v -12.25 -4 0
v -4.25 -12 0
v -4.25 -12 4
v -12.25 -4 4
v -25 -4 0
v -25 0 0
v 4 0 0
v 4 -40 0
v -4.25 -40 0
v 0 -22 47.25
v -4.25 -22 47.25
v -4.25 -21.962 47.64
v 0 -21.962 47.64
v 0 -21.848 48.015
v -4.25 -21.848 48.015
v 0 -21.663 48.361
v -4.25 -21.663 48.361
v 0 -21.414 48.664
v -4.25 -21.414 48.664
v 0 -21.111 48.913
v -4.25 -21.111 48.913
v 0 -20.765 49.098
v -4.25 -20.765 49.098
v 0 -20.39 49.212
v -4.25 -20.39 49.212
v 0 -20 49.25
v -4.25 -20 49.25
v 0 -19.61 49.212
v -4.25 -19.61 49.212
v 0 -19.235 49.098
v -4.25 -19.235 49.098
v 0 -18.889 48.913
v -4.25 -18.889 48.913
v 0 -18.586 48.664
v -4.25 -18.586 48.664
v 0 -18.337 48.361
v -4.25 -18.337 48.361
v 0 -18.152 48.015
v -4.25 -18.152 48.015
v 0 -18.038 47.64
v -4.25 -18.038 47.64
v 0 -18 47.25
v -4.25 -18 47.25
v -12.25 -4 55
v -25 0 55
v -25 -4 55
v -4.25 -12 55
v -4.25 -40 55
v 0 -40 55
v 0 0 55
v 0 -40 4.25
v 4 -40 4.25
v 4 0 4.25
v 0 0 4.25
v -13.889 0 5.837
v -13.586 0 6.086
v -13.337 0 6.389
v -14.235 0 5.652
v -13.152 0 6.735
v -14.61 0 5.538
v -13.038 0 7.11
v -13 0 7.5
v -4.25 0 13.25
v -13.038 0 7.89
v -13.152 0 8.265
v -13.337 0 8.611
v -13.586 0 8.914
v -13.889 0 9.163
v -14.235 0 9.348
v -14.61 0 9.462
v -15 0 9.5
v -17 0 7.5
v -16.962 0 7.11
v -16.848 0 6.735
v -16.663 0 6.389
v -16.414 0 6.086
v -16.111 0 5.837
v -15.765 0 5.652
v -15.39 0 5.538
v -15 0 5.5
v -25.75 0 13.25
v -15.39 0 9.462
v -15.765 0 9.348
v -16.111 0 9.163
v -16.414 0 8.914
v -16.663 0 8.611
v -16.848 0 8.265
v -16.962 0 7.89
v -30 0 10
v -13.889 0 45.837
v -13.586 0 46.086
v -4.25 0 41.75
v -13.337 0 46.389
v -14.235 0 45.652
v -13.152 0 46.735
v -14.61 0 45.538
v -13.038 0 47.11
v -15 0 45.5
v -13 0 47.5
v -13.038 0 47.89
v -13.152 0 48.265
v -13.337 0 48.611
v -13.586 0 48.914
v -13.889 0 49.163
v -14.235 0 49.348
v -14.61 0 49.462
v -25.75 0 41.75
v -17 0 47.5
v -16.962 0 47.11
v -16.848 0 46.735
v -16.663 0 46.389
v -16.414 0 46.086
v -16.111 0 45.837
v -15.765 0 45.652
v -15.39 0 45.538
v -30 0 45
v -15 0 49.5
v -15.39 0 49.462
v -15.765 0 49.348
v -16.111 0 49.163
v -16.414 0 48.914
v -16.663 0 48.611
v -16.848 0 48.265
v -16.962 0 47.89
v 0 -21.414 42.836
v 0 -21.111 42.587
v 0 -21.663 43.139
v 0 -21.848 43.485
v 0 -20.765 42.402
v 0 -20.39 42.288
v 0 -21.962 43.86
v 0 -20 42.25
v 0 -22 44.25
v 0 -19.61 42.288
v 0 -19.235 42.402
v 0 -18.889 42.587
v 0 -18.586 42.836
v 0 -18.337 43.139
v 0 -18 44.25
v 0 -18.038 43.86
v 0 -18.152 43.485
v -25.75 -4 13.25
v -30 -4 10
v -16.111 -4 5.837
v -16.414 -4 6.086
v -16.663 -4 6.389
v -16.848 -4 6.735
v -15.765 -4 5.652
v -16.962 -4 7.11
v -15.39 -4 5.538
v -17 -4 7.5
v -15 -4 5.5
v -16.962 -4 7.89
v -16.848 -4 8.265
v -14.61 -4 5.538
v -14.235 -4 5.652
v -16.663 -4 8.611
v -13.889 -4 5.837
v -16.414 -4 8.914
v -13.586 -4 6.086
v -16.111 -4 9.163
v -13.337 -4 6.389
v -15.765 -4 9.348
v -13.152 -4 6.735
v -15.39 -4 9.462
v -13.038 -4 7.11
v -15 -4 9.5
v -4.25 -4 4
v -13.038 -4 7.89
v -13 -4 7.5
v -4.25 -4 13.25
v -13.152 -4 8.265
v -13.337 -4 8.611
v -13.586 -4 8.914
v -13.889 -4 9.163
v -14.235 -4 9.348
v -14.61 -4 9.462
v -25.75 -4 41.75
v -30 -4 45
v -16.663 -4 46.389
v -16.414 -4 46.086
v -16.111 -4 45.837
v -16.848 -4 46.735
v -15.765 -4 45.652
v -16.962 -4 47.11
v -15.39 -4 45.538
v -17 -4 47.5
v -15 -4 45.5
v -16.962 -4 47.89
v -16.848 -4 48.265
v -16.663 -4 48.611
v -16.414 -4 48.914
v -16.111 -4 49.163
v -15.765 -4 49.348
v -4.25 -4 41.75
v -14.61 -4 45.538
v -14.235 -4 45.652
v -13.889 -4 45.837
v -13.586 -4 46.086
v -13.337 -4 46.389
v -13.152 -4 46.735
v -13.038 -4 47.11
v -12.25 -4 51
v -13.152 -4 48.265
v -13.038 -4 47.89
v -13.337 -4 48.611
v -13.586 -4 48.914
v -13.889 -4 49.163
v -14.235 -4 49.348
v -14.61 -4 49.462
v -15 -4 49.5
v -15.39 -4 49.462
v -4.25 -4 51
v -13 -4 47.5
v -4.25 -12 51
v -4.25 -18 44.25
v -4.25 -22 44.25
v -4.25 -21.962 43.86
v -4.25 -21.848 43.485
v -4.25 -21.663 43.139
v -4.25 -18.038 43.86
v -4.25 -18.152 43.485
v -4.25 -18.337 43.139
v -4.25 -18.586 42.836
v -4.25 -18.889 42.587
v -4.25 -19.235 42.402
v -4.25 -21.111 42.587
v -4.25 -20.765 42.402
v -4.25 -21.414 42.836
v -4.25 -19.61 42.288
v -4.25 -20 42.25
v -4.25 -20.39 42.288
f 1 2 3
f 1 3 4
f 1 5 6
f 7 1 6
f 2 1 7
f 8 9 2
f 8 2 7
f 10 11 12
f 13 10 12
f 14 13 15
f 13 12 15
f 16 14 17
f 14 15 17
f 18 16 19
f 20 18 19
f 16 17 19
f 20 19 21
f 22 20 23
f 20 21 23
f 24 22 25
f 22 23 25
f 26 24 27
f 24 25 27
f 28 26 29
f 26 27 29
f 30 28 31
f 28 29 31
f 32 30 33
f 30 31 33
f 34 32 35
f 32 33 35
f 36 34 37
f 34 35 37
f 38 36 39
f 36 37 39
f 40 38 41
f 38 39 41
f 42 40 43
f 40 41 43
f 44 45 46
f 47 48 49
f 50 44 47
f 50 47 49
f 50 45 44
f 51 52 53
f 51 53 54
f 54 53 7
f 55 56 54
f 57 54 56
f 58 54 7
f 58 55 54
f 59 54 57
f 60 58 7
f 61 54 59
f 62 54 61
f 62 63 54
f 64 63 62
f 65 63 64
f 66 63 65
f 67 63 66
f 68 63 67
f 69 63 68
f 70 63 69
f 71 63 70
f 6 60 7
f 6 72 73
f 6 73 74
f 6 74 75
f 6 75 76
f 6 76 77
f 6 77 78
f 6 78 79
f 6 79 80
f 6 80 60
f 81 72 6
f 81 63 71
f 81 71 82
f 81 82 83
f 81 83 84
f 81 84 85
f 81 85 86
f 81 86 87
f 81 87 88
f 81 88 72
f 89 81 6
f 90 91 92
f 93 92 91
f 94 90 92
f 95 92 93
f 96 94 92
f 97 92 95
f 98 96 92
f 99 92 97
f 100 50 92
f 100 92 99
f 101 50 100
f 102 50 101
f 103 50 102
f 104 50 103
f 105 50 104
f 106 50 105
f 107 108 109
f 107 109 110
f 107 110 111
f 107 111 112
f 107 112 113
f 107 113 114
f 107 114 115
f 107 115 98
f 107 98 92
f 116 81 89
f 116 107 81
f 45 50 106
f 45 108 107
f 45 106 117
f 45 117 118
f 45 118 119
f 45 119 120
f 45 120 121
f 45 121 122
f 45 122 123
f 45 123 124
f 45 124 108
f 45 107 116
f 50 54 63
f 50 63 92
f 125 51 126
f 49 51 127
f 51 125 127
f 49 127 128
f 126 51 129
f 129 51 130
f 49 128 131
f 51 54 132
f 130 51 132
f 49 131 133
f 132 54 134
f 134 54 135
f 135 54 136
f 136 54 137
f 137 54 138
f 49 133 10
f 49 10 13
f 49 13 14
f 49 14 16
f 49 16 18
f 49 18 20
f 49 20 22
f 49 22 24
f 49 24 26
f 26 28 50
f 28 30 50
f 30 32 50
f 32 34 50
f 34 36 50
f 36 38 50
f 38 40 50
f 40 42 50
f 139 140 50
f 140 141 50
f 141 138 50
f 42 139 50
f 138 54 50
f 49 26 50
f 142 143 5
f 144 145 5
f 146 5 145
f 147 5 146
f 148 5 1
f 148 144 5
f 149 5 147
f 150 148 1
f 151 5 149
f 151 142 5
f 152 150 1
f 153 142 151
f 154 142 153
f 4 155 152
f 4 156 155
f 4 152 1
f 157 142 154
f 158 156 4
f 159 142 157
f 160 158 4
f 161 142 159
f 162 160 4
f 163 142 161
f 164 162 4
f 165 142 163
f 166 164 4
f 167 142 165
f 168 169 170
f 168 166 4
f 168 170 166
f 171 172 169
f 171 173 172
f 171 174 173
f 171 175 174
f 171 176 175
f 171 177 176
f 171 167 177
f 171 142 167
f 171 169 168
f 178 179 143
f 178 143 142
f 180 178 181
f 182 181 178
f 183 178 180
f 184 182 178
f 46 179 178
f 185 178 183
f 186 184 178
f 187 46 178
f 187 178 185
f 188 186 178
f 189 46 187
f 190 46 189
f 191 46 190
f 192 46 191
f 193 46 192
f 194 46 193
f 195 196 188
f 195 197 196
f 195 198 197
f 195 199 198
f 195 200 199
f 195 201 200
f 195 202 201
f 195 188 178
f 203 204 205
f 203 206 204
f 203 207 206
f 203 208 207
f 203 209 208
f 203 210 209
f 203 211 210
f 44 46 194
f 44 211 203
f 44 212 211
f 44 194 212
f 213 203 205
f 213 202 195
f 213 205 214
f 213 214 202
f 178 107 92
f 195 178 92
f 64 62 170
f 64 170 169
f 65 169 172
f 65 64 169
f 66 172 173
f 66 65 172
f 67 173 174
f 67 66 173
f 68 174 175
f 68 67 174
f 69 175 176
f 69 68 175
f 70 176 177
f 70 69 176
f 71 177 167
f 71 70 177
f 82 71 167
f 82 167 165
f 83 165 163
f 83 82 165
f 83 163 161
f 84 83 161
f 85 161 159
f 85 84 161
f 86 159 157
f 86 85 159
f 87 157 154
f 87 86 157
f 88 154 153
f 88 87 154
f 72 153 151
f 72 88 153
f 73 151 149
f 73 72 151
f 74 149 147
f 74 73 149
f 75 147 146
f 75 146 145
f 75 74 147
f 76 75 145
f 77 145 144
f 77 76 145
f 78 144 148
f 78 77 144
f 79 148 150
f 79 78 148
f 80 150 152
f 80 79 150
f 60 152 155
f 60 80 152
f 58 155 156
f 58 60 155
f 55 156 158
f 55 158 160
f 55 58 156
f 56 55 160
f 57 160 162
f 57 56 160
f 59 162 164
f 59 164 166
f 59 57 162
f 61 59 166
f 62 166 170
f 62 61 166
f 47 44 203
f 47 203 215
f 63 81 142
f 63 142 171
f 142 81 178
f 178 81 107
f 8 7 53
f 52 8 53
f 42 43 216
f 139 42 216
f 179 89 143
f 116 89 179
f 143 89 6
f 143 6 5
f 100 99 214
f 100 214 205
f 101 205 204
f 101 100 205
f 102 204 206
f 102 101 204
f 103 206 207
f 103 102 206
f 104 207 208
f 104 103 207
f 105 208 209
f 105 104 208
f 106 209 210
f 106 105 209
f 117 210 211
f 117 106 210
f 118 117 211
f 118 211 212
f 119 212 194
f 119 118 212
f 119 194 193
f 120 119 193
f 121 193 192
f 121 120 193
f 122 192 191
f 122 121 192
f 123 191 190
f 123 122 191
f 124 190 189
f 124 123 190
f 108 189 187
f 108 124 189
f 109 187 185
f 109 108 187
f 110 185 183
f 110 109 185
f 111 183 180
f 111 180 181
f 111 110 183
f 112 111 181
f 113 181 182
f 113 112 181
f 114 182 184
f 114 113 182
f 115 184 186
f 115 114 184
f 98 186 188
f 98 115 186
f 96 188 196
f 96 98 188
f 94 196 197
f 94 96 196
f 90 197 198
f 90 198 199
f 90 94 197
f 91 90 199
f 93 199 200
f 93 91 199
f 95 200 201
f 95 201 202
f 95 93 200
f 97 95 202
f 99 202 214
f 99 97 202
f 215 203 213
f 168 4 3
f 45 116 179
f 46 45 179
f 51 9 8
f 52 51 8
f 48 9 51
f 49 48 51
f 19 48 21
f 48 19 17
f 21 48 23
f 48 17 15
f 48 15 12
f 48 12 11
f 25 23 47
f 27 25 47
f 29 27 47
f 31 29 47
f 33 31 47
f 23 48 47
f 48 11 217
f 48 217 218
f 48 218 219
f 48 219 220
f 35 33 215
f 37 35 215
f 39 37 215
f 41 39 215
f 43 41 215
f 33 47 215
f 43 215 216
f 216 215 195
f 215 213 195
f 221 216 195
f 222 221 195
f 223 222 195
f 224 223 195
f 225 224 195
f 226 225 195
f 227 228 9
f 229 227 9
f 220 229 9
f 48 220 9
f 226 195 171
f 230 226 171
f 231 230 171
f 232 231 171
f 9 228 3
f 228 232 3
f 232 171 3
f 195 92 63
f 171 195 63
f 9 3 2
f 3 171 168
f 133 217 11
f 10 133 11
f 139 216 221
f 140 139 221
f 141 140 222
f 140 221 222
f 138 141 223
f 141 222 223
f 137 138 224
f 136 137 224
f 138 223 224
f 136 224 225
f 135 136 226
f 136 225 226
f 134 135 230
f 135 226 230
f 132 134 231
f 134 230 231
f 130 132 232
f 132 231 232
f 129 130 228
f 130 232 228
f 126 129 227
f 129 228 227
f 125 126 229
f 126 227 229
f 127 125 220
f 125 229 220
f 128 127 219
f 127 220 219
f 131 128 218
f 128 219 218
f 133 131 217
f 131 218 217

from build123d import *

# Parameters (mm, degrees)
F0_W      = 30
F0_H      = 55
F0_R      = 2
F0_W_2    = 21.5
F0_H_2    = 28.5
F1_DEPTH  = 4
F3_DEPTH  = 36
F5_DEPTH  = 4
F7_W      = 4
F7_H      = 4.25
F8_DEPTH  = 4
F10_DEPTH = 4
F11_DEPTH = 8.251
F12_SIZE2 = 10
F12_SIZE  = 5


with BuildPart() as f1:
    # F0 (on Front) → F1 (new body)
    with BuildSketch(Plane.XZ):
        with Locations((-15, 27.5)):
            Rectangle(F0_W, F0_H)
        with Locations((-15, 7.5)):
            Circle(F0_R, mode=Mode.SUBTRACT)
        with Locations((-15, 27.5)):
            Rectangle(F0_W_2, F0_H_2, mode=Mode.SUBTRACT)
        with Locations((-15, 47.5)):
            Circle(F0_R, mode=Mode.SUBTRACT)
    extrude(amount=F1_DEPTH)

    # F2 (on face) → F3 (join)
    with BuildSketch(Plane.XZ.offset(4)):
        Polygon((0, 4.25), (0, 55), (-4.25, 55), (-4.25, 0), (4, 0), (4, 4.25), align=None)
    extrude(amount=F3_DEPTH)

    # F4 (on face) → F5 (join)
    with BuildSketch(Plane.XY.offset(55)):
        Polygon((-4.25, -12), (-4.25, -4), (-12.25, -4), align=None)
    extrude(amount=-F5_DEPTH)

    # F7 (on face) → F8 (join)
    with BuildSketch(Plane(origin=(0, -4, 0), x_dir=(-1, 0, 0), z_dir=(0, 1, 0))):
        with Locations((-2, 2.125)):
            Rectangle(F7_W, F7_H)
    extrude(amount=F8_DEPTH)

    # F9 (on face) → F10 (join)
    with BuildSketch(Plane(origin=(0, 0, 0), x_dir=(1, 0, 0), z_dir=(0, 0, -1))):
        Polygon((-4.25, 12), (-12.25, 4), (-4.25, 4), align=None)
    extrude(amount=-F10_DEPTH)

    # F6 (on face) → F11 (cut, through all)
    with BuildSketch(Plane(origin=(-4.25, 0, 0), x_dir=(0, -1, 0), z_dir=(-1, 0, 0))):
        with BuildLine():
            ThreePointArc((22, 47.25), (20, 49.25), (18, 47.25))
            Line((18, 47.25), (18, 44.25))
            ThreePointArc((18, 44.25), (20, 42.25), (22, 44.25))
            Line((22, 44.25), (22, 47.25))
        make_face()
    extrude(amount=-F11_DEPTH, mode=Mode.SUBTRACT)

    # F12
    f12_edges = [f1.edges().sort_by_distance(p)[0] for p in [
        (-30, -2, 0),
        (-30, -2, 55),
    ]]
    chamfer(f12_edges, length=F12_SIZE, length2=F12_SIZE2)


solid = f1.part
